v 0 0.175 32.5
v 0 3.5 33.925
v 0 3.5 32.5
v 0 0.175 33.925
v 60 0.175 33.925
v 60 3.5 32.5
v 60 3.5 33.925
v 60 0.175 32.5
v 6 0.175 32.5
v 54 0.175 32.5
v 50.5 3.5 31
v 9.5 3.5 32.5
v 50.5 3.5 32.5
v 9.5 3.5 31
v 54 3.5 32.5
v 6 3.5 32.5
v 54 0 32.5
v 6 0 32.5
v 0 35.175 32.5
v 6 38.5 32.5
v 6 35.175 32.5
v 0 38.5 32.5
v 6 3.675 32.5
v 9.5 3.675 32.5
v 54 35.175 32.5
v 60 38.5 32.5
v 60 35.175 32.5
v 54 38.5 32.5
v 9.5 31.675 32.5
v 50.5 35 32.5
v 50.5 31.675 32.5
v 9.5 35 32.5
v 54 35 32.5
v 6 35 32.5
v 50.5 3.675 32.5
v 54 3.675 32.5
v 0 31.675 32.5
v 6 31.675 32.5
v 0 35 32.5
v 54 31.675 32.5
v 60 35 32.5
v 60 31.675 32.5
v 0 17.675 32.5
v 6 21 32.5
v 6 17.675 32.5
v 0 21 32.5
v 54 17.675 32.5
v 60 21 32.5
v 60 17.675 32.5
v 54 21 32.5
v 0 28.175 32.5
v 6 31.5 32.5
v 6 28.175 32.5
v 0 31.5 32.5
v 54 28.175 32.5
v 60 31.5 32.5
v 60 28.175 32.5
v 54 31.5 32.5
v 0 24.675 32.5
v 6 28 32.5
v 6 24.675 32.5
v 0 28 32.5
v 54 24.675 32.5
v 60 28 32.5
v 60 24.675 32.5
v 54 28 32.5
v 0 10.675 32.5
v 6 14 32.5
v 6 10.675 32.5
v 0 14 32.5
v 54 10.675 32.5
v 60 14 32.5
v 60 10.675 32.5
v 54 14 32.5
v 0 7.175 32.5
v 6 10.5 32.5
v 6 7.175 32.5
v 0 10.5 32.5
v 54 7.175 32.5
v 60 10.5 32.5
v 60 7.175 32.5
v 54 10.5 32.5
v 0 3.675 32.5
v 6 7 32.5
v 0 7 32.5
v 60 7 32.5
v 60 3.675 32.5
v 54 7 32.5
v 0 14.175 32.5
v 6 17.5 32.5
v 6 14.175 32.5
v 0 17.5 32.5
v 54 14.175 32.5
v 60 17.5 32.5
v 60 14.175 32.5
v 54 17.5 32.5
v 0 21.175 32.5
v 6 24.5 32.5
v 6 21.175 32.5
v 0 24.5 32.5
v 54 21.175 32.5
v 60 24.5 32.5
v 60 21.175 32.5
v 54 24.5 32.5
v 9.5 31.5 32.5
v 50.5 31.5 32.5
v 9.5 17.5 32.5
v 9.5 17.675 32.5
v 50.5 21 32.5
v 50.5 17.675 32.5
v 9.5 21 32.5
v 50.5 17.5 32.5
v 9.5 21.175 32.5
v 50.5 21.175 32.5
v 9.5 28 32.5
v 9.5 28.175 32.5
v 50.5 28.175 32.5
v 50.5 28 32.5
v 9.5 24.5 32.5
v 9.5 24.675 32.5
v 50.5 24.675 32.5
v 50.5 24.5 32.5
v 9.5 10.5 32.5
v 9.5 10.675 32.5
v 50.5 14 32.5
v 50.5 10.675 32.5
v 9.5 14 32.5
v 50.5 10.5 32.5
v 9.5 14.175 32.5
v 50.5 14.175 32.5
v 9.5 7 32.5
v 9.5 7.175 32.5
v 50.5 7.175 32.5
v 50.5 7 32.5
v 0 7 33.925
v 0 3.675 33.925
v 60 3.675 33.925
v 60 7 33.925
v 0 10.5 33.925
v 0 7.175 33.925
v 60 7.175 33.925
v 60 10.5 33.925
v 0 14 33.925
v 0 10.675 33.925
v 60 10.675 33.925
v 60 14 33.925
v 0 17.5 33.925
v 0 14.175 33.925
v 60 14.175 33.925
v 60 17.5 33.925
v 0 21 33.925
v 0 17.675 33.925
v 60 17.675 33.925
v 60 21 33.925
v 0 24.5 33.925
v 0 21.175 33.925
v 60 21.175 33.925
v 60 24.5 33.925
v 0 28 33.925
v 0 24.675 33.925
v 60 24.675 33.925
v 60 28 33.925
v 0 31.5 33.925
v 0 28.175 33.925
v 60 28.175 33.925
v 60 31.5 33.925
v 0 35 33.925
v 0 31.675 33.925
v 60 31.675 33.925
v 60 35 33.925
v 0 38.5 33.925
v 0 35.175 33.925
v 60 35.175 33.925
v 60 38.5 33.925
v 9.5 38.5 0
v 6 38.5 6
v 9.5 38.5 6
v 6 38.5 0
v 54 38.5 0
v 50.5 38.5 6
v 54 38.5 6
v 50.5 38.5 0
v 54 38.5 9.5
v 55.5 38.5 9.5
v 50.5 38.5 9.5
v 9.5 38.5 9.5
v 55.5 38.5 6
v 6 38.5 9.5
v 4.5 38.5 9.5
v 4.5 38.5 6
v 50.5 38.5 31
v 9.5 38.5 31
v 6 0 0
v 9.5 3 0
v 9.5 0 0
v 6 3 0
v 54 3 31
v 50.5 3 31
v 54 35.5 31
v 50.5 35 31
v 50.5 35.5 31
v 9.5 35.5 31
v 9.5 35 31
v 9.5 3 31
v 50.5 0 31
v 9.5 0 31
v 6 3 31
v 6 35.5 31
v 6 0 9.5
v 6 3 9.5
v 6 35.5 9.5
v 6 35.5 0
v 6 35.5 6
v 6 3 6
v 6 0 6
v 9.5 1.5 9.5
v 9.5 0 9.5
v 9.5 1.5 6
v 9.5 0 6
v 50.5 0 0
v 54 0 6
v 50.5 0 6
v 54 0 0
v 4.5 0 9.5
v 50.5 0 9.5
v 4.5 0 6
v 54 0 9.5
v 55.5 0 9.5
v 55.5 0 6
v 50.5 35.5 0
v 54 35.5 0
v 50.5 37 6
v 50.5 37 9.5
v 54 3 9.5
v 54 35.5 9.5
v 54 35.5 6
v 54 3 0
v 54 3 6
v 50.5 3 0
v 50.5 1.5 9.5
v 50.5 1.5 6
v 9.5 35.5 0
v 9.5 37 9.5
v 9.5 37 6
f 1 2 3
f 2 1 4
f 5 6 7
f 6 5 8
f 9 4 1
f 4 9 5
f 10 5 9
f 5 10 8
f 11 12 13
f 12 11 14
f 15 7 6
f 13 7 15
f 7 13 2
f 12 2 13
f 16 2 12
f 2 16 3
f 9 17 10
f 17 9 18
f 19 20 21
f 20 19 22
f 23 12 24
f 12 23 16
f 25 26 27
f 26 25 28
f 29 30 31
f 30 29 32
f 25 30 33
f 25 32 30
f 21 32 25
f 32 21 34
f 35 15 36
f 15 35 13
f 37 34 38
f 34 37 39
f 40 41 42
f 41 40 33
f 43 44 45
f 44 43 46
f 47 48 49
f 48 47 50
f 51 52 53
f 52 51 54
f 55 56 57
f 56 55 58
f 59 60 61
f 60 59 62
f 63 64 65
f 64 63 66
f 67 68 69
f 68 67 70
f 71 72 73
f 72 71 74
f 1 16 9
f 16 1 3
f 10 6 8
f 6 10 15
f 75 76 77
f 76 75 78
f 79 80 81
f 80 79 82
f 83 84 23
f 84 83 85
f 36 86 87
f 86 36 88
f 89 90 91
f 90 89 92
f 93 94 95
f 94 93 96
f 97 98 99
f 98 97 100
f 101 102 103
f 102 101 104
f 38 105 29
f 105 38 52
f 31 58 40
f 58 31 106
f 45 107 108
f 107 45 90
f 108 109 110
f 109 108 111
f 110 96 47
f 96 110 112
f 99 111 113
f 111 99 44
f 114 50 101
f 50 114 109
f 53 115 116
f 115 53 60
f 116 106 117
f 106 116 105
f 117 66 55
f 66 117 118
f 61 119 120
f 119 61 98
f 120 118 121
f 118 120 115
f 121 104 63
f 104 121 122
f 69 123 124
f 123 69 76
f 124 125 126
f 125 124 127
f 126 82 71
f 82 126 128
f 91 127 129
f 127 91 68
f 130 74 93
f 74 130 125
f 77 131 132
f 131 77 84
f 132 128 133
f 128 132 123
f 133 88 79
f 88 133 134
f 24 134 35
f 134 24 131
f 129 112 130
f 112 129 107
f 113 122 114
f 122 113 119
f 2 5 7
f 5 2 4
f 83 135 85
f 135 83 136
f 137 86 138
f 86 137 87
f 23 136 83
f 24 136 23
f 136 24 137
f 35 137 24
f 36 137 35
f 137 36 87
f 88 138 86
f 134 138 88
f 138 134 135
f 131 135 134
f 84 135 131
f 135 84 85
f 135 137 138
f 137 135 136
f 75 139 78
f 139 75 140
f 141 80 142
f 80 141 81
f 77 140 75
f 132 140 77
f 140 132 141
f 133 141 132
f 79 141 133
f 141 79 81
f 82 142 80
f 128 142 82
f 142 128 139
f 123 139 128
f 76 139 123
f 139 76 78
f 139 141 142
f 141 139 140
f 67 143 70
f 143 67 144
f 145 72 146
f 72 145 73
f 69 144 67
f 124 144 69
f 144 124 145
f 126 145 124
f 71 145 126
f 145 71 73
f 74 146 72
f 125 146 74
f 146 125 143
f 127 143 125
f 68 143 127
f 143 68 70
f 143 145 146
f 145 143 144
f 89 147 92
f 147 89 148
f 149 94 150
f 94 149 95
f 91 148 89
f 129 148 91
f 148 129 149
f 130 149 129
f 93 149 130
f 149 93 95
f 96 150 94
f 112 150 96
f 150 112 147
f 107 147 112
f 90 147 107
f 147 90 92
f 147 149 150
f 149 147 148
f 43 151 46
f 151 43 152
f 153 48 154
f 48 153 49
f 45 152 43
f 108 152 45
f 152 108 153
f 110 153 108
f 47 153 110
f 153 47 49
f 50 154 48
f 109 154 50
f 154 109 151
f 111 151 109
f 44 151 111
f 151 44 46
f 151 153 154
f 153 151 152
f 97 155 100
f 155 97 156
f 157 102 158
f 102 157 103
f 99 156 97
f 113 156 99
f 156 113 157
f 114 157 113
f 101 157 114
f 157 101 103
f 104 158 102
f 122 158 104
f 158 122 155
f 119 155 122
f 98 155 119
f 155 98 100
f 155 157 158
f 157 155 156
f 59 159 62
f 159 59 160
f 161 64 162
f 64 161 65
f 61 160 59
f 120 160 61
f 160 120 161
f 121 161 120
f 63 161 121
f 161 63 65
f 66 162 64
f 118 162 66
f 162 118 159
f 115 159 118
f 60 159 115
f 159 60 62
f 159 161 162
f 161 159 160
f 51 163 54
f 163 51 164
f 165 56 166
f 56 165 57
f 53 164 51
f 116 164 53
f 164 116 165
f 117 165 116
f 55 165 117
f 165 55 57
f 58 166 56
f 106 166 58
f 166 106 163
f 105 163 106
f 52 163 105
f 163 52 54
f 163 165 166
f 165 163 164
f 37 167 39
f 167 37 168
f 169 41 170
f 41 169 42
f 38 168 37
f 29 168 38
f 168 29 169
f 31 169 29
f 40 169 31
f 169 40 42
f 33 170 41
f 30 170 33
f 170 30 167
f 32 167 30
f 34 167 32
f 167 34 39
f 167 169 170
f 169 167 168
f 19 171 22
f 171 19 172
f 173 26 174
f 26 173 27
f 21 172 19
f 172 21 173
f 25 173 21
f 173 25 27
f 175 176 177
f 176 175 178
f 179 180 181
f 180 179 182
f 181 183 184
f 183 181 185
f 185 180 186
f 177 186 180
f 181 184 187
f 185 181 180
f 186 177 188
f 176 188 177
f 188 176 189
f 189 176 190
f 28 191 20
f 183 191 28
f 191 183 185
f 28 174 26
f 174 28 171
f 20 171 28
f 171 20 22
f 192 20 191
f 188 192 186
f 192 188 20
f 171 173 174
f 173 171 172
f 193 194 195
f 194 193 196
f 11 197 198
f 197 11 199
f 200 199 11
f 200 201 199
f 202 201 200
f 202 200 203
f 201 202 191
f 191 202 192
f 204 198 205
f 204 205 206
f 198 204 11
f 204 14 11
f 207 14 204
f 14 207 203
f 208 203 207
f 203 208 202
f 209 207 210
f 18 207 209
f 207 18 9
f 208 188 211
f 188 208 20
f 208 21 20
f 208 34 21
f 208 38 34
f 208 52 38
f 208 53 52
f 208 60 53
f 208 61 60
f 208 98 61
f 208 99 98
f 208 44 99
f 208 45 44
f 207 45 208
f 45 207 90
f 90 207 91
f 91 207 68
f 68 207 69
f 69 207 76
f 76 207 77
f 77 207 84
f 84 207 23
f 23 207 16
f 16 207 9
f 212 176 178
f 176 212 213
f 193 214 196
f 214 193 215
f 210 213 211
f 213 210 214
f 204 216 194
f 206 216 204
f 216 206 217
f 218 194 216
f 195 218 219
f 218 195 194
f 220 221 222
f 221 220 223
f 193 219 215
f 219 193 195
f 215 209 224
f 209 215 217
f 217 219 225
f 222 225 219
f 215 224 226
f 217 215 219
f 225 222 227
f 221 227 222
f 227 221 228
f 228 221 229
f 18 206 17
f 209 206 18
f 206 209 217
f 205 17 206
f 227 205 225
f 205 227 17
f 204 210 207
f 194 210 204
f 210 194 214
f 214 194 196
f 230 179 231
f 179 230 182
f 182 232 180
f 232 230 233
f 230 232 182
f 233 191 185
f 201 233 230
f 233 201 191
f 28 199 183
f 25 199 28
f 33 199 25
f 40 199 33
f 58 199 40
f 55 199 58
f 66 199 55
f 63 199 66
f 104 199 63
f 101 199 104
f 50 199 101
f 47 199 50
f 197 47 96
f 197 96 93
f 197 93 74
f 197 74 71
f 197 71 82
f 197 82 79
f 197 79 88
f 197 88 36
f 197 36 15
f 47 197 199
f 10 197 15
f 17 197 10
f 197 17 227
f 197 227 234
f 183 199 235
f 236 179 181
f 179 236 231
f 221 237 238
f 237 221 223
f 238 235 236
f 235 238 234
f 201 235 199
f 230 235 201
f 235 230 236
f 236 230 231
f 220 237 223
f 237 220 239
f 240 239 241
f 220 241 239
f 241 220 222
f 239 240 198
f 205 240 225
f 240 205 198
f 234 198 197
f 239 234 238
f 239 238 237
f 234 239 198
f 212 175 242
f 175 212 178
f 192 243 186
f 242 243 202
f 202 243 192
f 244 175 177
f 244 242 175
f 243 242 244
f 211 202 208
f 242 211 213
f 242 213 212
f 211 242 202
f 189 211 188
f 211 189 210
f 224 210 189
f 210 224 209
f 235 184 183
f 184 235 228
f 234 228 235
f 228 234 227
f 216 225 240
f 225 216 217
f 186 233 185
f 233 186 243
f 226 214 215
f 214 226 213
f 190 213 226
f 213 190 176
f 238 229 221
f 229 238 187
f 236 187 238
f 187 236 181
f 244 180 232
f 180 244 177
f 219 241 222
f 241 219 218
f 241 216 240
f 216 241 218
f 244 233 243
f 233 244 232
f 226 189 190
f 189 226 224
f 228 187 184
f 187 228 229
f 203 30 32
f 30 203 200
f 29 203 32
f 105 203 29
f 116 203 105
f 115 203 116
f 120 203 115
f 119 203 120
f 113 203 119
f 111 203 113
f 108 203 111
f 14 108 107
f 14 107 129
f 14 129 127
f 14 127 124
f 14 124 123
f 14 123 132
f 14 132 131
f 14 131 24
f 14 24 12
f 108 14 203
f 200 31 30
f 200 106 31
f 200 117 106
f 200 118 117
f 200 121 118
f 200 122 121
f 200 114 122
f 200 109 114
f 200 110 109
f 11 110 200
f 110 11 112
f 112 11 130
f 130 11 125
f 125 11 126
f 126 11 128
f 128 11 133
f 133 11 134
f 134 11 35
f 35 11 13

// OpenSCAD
// Units are in inches

// Dimensions of the boards I'm working with (2x4, in name only)
boardWidth = 3.5;
boardThickness = 1.5;

// 24 2x4 boards make the top. The boards are really 1.5"x3.5" tho.
benchtopWidth = 60;  // 5' 
benchtopDepth = 38.5;  // 3'
benchtopHeight = 36; // 3'

// Distance from the floor to the bottom crossbars
bottomClearance = 6;

// Insets of the legs from the edges of the benchtop
iLeft = 6;
iRight = 6;
iFront = 0;
iBack = 0;


// Legs are 2 boards glued together
legDepth = 2 * boardThickness;
legWidth = boardWidth;

// frameHeight is the height of the frame. The benchtop sits on top of
// the frame.
frameHeight = benchtopHeight - boardWidth;

// Scaling for the boards placed in the benchtop. Setting this to
// something smaller than 1 will show the individual boards used to
// make the top.
scaleFactor=0.95;

// A 2x4 board (actually 1.5"x3.5")
module board(length = 96) {
    echo("Board: ", length=length);
    cube([length, boardThickness, boardWidth]);
}

// The top of the bench. Boards are stacked vertically to
// create a top the thickness of the board width (3.5" for a 2x4)
benchtopBoardCount = benchtopDepth / boardWidth;
echo(benchtopBoardCount=benchtopBoardCount);
module benchtop() {
    for (i = [0:boardWidth:benchtopDepth - boardWidth]) {
        translate([0, i + boardWidth, 0]) {
            rotate([90, 0, 0]) 
            scale([1, scaleFactor, scaleFactor]) {
                board(benchtopWidth);
            }
        }    
    }
}

// One leg = 2 boards together
module leg(legHeight = frameHeight - boardThickness) {
    rotate([0, 270, 0]) board(legHeight);
    translate([0, boardThickness, 0]) rotate([0, 270, 0]) board(legHeight);
}

module crossbars() {
    echo ("Crossbars");
    crossbarWidth = benchtopWidth - iLeft - iRight;
    crossbarDepth = benchtopDepth - iBack - iFront;

    translate([iLeft, iFront, 0]) board(crossbarWidth);
    translate([iLeft, benchtopDepth - iBack - boardThickness, 0]) board(crossbarWidth);
    translate([iLeft, iFront, 0]) rotate([0, 0, 90]) board(crossbarDepth);
    translate([benchtopWidth - iRight + boardThickness, iFront, 0]) rotate([0, 0, 90]) board(crossbarDepth);
}

module topbars() {
    echo("Top bars");
    topbarWidth = benchtopWidth - iLeft - iRight;
    topbarDepth = benchtopDepth - iBack - iFront;

    // These are cut with 45 degree ends
    translate([iLeft, iFront + boardWidth, 0]) rotate([90, 0, 0]) board(topbarWidth);
    translate([iLeft, benchtopDepth - iBack, 0]) rotate([90, 0, 0]) board(topbarWidth);
    translate([iLeft, iFront, 0]) rotate([90, 0, 90]) board(topbarDepth);
    translate([benchtopWidth - iRight - boardWidth, iFront, 0]) rotate([90, 0, 90]) board(topbarDepth);
}

// Creates the frame with legs inset to the argument values
module frame() {
    // 4 legs
    echo ("Legs");
    translate([iLeft + legWidth, iFront, 0]) leg();
    translate([benchtopWidth - iRight, benchtopDepth - legDepth - iBack, 0]) leg();
    translate([benchtopWidth - iRight, iFront, 0]) leg();
    translate([iLeft + legWidth, benchtopDepth - iBack - legDepth, 0]) leg();

    // Crossbars
    translate([0, 0, bottomClearance]) crossbars(iLeft, iRight, iFront, iBack);
    translate([0, 0, frameHeight - boardThickness]) topbars(iLeft, iRight, iFront, iBack);
}

// Draw it all
color("Green") translate([0, 0, benchtopHeight - boardWidth]) benchtop();
color("BurlyWood") frame();
